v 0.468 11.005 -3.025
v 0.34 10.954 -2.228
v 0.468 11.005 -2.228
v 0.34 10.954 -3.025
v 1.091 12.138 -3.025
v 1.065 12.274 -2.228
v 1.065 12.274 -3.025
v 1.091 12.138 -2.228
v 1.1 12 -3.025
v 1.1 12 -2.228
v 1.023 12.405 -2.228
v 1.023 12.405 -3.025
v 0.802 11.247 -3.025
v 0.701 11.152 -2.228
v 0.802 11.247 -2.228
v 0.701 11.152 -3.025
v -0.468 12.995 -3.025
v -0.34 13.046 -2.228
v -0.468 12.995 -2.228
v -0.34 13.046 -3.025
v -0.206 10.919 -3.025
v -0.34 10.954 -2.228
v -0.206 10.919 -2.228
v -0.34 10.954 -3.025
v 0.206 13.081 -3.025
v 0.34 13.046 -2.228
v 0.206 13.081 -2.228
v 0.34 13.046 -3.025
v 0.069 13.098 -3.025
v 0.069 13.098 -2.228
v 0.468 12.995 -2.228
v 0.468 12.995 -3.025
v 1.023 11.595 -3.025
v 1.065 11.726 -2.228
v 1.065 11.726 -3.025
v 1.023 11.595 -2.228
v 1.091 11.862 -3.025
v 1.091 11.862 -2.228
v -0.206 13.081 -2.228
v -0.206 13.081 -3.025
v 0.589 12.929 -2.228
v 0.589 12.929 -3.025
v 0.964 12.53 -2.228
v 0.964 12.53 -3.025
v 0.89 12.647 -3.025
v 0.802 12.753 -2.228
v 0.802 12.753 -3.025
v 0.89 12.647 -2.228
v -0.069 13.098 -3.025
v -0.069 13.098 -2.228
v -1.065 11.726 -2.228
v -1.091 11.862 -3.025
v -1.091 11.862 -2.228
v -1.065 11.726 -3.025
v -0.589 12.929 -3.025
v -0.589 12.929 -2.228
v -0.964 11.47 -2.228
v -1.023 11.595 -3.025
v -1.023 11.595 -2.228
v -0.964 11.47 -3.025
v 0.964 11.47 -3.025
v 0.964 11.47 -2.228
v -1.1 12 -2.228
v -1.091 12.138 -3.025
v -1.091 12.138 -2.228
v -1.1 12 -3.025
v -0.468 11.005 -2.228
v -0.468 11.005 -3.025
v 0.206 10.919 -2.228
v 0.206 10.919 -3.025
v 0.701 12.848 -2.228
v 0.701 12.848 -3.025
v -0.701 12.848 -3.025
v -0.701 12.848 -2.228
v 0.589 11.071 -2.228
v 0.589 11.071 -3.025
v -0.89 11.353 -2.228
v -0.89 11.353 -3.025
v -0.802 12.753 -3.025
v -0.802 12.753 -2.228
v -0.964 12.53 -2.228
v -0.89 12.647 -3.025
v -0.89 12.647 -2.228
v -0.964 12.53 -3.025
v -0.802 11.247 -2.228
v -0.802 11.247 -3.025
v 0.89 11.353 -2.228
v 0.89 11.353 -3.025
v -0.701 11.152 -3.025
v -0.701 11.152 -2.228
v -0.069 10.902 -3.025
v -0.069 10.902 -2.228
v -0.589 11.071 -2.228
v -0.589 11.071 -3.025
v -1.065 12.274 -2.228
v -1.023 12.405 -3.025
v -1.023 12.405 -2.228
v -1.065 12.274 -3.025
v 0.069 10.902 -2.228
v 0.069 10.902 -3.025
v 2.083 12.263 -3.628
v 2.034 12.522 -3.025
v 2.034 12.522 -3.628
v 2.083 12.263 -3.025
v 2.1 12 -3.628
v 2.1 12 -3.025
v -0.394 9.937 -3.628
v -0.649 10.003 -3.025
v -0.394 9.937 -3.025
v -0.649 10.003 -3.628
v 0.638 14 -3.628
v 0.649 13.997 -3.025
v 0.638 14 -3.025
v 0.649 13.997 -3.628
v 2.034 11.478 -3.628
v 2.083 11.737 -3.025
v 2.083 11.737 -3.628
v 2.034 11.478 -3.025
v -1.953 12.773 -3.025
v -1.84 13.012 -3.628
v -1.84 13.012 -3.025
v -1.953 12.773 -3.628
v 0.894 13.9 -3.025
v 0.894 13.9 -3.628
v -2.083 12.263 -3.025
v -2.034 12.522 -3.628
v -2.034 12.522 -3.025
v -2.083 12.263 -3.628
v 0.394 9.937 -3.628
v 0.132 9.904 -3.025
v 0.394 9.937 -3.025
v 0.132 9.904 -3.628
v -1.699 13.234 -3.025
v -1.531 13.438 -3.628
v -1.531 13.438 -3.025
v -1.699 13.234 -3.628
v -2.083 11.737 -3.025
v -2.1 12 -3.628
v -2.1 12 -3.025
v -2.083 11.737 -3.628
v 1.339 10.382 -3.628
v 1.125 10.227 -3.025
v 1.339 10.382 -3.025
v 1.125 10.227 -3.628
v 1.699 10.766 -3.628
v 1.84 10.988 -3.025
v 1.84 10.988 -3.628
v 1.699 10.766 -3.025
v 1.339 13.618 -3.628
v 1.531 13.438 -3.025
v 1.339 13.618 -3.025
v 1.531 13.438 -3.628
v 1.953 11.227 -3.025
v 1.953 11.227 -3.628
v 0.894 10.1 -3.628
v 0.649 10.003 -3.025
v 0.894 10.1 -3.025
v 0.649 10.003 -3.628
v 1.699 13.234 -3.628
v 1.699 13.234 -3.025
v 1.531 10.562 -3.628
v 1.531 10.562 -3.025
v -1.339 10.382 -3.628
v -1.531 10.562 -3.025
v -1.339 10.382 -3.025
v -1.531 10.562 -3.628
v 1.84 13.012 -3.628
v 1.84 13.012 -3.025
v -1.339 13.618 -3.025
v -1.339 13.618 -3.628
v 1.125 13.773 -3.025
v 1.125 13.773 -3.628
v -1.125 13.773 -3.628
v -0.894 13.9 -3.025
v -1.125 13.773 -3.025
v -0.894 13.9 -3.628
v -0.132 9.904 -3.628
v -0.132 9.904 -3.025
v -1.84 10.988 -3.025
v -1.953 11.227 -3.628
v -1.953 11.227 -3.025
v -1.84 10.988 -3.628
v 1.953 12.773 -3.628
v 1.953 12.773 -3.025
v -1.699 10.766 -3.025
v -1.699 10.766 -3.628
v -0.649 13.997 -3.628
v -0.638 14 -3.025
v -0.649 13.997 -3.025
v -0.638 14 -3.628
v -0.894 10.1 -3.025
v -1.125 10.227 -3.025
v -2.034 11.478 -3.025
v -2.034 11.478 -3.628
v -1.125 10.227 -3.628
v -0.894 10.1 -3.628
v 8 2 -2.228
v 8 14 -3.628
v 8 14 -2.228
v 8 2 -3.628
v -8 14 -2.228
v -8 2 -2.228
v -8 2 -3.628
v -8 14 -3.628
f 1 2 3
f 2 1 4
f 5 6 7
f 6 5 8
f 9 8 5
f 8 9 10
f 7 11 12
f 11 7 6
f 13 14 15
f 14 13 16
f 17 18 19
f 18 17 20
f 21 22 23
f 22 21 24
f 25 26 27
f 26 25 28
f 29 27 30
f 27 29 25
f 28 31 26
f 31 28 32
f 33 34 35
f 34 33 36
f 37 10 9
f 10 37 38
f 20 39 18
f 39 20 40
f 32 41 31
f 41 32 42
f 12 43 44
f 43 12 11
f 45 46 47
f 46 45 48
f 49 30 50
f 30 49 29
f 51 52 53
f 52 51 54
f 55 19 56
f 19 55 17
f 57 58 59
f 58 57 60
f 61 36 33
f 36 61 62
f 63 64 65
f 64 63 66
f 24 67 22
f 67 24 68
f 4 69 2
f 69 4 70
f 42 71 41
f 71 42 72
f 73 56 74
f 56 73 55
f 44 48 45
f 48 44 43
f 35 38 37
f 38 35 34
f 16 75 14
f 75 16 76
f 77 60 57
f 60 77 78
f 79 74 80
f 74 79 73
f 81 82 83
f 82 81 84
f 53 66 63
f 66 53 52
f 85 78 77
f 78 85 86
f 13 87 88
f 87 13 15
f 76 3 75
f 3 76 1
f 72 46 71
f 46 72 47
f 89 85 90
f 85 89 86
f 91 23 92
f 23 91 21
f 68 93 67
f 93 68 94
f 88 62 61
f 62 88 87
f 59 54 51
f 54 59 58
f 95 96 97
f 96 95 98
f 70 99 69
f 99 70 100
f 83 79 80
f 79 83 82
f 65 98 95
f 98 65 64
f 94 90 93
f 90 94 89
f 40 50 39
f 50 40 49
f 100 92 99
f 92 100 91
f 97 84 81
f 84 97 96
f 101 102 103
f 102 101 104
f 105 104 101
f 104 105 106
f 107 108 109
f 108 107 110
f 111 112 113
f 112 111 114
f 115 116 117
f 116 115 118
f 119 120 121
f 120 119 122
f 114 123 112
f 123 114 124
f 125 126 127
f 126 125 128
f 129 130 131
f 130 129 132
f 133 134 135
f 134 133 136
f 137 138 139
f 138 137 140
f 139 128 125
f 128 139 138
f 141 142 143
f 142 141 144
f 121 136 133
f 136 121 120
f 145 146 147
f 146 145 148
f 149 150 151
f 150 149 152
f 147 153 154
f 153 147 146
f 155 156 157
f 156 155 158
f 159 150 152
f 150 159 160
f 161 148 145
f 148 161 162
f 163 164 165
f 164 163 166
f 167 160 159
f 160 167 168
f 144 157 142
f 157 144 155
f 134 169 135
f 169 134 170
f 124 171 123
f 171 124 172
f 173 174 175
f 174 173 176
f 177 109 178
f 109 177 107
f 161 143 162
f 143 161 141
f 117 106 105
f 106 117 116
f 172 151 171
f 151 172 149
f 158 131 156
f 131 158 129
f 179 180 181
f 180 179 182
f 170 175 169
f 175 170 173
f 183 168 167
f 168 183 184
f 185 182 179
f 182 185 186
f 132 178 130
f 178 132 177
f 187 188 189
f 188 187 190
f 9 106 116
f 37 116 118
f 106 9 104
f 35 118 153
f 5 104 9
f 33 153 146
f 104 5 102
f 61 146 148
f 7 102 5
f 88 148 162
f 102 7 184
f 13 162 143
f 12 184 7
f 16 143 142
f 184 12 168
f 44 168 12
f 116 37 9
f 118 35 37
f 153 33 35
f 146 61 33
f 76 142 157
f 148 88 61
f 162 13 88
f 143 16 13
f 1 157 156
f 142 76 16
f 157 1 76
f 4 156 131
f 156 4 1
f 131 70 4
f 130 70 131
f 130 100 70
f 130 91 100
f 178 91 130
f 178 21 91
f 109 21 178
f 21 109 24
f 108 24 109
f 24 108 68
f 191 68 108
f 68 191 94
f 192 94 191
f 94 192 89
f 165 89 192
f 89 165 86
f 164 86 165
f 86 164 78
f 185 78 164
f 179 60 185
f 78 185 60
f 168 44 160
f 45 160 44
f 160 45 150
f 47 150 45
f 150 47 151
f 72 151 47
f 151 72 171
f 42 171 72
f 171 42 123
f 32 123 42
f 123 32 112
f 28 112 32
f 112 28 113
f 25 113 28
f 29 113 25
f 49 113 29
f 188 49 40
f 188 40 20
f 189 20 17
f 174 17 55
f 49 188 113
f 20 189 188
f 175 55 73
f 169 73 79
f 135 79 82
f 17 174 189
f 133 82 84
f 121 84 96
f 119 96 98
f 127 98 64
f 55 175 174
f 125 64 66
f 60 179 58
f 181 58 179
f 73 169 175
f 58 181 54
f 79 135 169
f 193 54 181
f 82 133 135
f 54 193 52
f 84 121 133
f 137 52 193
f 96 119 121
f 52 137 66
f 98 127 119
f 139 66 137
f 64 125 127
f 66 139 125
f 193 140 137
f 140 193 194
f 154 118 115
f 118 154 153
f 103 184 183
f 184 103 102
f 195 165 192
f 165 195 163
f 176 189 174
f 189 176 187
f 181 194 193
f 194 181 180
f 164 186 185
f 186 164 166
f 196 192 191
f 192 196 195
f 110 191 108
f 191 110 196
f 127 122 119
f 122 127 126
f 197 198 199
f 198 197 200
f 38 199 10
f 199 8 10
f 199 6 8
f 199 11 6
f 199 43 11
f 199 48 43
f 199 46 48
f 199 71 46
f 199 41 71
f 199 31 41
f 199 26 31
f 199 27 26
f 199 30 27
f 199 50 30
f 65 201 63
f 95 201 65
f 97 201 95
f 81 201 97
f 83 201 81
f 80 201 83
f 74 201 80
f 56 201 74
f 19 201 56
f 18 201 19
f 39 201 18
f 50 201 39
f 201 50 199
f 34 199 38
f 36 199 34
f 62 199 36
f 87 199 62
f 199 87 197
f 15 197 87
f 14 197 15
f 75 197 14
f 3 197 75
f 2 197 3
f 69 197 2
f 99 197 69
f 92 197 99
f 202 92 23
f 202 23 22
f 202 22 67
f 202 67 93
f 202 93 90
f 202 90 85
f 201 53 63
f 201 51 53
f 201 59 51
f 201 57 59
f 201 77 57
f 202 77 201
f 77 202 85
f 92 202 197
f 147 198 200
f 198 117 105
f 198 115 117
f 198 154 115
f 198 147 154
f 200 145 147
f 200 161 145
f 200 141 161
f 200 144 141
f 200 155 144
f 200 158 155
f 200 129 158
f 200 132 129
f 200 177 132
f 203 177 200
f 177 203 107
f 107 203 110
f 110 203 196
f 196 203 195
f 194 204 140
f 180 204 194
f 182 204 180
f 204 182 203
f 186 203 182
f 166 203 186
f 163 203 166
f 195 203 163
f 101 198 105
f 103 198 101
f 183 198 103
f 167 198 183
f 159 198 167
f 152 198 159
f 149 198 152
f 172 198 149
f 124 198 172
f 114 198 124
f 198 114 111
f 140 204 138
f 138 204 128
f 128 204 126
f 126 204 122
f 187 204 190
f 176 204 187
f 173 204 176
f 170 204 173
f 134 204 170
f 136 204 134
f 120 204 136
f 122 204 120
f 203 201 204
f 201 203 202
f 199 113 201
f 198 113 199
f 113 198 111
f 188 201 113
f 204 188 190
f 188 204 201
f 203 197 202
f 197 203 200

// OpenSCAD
// file: constants.scad
$fn = 50;

leaf_x = 6;
leaf_y = 19;
leaf_z = 0.8;
leaf_angle = 30;
leaf_wide_angle = 20;
leaf_open_angle = 90;
leaf_slide_angle = 50;
leaf_radius = 12;
leafs = 6;

axis_length = 10;
axis_radius = 1;
bearing_length = 1.25;
tolerance = 0.1;
// main file
include <constants.scad>

module base() {
  color([0.4, 0.4, 0.4, 1]) difference() {
    translate([0, leaf_radius/2+axis_radius*2, -leaf_z*3.66])  
        cube([axis_length*1.6, leaf_radius, axis_radius*1.4], center=true);

    union() {      
        translate([0, leaf_radius, -leaf_z*3]) 
            cylinder(bearing_length*2, axis_radius+tolerance, axis_radius+tolerance, center=true);
        
        translate([0, leaf_radius, -leaf_z*3-bearing_length]) 
            cylinder(bearing_length, axis_radius*2+tolerance, axis_radius*2+tolerance, center=true);
    }
  }
}

// main
base();
